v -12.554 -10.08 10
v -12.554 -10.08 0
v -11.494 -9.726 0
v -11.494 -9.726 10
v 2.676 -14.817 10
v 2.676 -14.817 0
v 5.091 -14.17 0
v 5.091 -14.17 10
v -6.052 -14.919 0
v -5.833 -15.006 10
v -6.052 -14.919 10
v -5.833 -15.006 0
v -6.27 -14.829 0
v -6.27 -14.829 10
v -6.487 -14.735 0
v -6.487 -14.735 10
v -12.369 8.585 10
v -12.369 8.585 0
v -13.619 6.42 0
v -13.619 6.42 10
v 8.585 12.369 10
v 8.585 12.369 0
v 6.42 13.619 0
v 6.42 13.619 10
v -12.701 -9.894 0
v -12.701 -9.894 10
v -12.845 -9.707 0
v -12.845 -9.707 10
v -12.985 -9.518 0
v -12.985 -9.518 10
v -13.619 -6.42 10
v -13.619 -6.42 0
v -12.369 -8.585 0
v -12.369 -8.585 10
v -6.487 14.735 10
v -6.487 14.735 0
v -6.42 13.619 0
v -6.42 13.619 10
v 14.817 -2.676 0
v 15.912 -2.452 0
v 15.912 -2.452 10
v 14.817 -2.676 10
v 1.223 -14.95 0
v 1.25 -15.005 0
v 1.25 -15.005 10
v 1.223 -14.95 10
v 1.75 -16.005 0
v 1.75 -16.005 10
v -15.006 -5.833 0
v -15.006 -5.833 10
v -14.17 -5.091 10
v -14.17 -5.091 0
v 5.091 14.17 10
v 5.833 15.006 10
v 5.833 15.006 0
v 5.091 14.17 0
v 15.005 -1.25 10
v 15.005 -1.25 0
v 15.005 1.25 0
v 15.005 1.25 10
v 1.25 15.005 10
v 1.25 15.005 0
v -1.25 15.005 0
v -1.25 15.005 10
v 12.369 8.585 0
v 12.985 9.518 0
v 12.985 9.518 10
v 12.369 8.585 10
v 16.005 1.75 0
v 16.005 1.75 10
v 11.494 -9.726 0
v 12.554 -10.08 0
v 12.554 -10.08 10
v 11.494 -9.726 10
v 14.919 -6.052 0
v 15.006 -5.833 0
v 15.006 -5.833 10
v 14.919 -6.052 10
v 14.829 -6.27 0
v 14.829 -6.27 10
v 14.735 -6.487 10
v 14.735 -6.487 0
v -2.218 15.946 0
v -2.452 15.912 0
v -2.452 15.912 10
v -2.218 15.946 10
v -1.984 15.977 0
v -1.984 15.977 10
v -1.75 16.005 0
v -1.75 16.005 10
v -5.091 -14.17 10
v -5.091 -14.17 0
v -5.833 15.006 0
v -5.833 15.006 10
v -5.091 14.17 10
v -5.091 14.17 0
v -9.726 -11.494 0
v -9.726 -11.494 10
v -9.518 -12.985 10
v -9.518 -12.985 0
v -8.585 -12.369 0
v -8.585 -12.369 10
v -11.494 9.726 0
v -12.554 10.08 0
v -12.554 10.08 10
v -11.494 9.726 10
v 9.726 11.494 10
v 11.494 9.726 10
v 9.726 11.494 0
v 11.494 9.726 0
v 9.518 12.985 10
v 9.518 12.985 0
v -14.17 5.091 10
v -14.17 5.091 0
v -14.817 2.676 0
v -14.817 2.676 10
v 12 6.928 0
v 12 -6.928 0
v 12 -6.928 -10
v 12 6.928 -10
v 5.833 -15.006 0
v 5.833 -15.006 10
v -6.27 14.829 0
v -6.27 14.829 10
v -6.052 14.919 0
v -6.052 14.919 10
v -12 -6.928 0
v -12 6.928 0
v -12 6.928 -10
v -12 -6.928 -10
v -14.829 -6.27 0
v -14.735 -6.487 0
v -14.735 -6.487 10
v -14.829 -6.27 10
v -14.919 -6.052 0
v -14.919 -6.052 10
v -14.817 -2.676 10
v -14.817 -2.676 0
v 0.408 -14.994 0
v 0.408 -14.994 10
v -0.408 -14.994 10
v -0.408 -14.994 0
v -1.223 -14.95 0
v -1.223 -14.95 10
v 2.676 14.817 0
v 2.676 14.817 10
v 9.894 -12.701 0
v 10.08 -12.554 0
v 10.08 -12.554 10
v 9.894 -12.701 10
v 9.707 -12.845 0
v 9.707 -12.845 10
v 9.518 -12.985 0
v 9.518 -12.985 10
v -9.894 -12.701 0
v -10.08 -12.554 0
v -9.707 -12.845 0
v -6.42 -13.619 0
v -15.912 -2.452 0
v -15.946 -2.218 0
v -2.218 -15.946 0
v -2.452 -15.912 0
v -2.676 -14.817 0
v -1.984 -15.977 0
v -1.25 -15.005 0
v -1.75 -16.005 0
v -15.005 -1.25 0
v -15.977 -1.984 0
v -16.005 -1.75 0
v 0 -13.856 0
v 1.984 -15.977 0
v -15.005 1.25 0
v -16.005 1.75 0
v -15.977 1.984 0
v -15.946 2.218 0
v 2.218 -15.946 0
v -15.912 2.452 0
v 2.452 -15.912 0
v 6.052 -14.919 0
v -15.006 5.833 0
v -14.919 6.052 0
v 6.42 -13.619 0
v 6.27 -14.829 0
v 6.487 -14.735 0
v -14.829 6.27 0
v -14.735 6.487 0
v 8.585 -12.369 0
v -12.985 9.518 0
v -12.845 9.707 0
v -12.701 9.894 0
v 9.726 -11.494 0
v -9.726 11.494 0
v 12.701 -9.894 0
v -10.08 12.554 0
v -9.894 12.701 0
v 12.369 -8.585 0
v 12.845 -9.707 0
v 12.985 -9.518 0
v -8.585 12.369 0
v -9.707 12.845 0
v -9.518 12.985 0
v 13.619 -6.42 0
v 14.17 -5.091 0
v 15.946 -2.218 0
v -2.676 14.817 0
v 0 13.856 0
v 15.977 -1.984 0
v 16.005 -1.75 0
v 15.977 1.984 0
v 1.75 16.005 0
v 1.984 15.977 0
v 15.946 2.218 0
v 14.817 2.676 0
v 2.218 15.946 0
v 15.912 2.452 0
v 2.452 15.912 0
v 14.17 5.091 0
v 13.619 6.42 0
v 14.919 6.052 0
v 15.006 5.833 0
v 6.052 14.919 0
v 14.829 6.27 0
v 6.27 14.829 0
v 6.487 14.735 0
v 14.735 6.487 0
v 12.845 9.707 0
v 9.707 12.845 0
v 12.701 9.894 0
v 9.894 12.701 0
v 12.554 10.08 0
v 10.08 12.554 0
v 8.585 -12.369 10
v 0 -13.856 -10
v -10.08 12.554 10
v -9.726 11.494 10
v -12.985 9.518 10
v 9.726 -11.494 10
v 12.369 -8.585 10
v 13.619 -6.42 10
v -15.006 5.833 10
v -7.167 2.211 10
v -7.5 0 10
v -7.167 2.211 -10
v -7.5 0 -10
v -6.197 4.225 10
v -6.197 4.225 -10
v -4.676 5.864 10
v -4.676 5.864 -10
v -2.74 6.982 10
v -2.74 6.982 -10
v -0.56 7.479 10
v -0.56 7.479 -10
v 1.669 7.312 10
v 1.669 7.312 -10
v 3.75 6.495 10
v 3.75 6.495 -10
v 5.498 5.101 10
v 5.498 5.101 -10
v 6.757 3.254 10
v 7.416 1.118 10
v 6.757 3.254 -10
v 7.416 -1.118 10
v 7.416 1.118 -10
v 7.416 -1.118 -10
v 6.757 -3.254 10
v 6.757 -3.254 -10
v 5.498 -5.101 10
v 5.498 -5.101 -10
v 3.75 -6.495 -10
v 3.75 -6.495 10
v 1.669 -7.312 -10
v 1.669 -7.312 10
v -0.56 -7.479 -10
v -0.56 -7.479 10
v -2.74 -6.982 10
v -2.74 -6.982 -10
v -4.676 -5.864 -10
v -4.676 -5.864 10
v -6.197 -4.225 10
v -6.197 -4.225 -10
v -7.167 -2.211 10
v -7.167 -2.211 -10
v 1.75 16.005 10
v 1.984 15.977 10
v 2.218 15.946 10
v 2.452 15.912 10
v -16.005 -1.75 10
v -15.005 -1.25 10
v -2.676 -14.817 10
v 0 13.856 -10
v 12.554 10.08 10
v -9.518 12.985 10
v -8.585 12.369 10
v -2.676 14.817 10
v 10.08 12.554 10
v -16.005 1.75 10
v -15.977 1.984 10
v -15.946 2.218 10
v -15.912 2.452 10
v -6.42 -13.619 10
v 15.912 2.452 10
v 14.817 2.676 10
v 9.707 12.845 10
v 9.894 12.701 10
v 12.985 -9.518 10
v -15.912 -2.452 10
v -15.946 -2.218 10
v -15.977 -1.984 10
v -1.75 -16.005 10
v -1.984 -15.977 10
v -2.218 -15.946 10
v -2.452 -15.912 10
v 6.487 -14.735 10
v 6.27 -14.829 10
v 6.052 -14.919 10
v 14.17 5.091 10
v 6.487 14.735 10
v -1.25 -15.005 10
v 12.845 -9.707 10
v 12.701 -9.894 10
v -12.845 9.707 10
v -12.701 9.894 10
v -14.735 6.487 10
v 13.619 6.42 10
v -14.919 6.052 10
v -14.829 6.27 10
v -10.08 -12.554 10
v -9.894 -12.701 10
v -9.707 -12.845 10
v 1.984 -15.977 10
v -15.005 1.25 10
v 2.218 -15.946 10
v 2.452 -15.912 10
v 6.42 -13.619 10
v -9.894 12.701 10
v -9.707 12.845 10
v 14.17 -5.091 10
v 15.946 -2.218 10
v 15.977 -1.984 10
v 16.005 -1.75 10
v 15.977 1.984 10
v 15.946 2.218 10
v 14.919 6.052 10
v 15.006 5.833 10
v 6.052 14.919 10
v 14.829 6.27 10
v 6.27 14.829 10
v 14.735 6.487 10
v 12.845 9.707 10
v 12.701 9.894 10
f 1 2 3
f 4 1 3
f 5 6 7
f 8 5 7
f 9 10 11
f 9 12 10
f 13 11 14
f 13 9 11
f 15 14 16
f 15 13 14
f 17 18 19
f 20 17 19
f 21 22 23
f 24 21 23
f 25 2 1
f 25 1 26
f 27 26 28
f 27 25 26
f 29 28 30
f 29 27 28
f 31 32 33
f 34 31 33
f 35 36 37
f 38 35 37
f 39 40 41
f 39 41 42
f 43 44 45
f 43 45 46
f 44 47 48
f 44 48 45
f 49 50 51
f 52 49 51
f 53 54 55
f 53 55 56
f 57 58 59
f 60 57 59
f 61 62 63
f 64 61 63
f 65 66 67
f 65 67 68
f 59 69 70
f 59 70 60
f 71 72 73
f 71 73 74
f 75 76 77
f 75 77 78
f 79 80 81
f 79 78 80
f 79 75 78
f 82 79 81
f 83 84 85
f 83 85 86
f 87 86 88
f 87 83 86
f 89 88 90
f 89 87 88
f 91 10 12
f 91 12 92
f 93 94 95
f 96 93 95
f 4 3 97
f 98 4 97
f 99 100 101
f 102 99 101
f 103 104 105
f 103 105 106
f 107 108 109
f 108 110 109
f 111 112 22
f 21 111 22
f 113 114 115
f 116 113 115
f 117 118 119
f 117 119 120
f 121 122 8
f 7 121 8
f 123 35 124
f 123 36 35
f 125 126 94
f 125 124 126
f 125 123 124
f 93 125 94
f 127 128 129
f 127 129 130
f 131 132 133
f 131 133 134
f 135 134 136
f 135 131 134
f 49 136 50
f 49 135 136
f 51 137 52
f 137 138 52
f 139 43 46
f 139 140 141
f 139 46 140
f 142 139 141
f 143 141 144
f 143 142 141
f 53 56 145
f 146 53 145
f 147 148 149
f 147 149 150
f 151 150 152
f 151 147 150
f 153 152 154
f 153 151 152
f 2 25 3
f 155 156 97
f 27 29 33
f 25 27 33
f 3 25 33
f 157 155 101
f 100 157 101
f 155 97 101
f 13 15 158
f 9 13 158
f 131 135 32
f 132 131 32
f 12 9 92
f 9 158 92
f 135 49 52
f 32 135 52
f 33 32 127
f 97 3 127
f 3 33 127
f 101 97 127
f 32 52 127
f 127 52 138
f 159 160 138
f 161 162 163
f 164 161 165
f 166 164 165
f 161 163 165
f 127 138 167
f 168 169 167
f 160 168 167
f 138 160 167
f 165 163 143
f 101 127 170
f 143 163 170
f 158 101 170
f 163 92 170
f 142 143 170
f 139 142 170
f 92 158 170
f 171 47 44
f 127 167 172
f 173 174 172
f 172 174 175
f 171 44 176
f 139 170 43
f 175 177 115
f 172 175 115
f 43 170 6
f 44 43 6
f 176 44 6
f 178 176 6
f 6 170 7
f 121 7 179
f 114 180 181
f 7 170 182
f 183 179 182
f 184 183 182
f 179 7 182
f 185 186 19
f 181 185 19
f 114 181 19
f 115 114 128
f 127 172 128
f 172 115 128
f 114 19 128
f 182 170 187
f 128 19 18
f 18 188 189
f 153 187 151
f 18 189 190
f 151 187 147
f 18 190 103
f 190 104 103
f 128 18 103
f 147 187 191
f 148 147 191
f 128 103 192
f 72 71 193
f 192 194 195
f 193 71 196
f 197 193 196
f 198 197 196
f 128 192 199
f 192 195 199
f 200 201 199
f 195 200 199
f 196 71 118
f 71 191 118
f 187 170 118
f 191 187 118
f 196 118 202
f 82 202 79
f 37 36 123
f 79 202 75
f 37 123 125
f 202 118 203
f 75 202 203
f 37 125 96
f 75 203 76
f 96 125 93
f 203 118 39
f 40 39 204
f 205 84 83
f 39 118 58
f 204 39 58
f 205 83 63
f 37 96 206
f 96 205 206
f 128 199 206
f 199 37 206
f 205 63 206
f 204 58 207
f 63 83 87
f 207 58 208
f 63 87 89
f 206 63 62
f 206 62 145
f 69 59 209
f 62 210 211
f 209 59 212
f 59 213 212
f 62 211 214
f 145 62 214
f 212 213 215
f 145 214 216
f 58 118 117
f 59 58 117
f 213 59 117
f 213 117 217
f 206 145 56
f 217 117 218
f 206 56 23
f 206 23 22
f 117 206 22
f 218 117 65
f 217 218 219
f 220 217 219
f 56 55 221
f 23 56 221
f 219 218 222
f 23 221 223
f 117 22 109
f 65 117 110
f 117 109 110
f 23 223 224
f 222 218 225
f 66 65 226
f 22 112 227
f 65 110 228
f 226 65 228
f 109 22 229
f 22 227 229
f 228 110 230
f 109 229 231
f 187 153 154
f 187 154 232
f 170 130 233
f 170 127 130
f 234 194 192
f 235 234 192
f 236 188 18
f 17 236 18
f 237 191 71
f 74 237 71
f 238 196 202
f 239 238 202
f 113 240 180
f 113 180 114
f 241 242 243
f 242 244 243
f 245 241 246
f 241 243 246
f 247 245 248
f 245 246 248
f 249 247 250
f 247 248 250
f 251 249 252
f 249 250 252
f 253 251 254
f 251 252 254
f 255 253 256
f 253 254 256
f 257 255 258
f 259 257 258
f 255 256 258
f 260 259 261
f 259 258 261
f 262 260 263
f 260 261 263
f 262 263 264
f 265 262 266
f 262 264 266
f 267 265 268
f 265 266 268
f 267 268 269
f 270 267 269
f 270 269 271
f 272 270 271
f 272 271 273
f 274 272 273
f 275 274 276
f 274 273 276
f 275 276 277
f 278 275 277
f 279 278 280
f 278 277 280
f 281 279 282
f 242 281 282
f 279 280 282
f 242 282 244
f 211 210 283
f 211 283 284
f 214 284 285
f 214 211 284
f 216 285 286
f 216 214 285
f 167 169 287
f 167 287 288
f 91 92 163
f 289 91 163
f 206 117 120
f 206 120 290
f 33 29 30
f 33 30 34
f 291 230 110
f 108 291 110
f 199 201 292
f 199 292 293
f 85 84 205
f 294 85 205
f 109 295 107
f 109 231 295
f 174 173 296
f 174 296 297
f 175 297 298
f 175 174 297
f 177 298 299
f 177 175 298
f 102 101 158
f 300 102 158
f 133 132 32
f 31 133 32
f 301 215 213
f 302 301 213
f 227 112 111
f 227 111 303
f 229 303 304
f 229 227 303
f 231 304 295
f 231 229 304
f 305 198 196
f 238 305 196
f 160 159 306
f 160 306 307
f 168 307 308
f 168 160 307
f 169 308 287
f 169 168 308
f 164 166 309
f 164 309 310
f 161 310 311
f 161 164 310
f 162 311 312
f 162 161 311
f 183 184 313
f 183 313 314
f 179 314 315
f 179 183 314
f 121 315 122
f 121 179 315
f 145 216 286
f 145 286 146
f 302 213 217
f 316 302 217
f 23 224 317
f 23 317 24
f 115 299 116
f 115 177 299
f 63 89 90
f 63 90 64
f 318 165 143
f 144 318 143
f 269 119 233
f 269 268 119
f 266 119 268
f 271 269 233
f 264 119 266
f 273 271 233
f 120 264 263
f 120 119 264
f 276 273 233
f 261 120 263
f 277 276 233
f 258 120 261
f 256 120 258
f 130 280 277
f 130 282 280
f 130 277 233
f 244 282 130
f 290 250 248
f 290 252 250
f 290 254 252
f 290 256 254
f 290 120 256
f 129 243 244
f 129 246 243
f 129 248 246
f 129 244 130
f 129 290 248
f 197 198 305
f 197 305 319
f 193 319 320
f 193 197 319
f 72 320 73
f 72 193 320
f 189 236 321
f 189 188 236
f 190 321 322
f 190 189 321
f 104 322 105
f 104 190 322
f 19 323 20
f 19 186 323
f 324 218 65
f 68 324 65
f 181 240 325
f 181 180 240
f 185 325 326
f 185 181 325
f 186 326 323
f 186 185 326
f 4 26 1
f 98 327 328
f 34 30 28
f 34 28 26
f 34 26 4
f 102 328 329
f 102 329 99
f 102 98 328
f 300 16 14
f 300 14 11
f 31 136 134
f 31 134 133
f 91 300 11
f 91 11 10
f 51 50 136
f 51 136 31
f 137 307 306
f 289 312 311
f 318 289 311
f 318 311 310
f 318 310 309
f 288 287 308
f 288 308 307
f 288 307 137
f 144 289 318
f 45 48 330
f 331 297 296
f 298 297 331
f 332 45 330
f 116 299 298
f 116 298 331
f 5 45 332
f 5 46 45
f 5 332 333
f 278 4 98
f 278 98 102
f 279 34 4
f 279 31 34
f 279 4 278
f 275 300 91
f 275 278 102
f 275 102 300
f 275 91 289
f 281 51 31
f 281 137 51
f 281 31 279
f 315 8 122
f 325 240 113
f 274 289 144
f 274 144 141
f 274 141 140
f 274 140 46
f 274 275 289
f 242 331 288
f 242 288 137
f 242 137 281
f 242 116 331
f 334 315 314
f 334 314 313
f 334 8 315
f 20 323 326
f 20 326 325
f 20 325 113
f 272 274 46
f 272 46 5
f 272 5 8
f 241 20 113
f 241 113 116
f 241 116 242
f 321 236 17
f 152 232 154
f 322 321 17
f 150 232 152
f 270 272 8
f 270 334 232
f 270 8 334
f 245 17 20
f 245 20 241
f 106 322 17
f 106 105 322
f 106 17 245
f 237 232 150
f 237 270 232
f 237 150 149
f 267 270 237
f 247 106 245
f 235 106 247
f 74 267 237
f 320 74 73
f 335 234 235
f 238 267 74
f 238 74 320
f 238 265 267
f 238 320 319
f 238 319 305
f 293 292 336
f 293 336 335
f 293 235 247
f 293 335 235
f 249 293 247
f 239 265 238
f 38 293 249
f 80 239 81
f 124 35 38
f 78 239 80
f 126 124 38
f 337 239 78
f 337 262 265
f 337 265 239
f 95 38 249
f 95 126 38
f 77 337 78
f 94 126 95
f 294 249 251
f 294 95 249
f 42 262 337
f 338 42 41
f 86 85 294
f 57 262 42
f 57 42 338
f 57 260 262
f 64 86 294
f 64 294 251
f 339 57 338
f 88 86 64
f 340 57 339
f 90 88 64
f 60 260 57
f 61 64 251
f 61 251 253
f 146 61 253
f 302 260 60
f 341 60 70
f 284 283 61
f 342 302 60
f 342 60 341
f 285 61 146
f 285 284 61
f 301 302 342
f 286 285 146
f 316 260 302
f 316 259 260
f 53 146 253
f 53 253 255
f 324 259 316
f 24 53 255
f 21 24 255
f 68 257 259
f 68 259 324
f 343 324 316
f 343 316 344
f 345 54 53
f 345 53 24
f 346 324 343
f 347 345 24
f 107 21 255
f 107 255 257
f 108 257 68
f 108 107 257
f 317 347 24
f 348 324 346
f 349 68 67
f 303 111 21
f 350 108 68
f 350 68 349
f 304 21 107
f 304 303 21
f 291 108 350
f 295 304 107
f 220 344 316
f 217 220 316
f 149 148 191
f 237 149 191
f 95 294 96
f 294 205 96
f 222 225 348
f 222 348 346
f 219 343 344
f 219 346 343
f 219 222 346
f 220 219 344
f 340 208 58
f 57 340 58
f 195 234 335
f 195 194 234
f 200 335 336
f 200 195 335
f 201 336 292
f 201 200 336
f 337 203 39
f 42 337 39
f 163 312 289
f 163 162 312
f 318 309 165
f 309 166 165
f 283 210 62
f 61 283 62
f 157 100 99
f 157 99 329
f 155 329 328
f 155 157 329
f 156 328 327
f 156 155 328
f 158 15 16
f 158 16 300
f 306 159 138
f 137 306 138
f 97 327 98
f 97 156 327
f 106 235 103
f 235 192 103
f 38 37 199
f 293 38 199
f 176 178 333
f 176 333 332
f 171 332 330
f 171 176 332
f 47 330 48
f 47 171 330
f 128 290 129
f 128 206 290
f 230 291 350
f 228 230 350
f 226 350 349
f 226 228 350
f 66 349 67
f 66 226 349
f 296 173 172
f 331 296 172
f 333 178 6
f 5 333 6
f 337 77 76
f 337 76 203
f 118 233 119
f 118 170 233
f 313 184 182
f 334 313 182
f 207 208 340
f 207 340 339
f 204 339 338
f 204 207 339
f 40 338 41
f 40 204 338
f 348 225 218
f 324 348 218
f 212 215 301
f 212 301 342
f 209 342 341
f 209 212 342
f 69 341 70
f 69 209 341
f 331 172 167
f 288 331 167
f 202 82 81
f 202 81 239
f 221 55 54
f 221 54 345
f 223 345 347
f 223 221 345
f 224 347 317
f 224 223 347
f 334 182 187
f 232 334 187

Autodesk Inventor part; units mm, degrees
ref_plane "YZ Plane" through (0, 0, 0) normal (1, 0, 0) x (0, 1, 0)
ref_plane "XZ Plane" through (0, 0, 0) normal (0, 1, 0) x (-1, 0, 0)
ref_plane "XY Plane" through (0, 0, 0) normal (0, 0, 1) x (1, 0, 0)
sketch "Sketch1" plane through (0, 0, 0) normal (0, 0, 1) x (1, 0, 0)
  circle A0 centre (0, 0) radius 17.25
  circle A1 centre (0, 0) radius 16.1
  circle A2 centre (0, 0) radius 15
  line L0 (-1.25, -15.0046) -> (1.25, -15.0046)
  line L1 (-1.75, -16.0046) -> (1.75, -16.0046)
  line L2 (1.75, -16.0046) -> (1.25, -15.0046)
  line L3 (-1.75, -16.0046) -> (-1.25, -15.0046)
  line L4 (-1.25, -15.0046) -> (-1.2227, -14.9501)
  line L5 (1.25, -15.0046) -> (1.2227, -14.9501)
  line L6 (2.6761, -14.8169) -> (5.0909, -14.1698)
  line L7 (2.4519, -15.9122) -> (2.6761, -14.8169)
  line L8 (2.6761, -14.8169) -> (2.6883, -14.7571)
  line L9 (5.8327, -15.0063) -> (5.0909, -14.1698)
  line L10 (5.0909, -14.1698) -> (5.0504, -14.1242)
  line L11 (6.4198, -13.6194) -> (8.5848, -12.3694)
  line L12 (6.4868, -14.7354) -> (6.4198, -13.6194)
  line L13 (6.4198, -13.6194) -> (6.4161, -13.5585)
  line L14 (9.5178, -12.9854) -> (8.5848, -12.3694)
  line L15 (8.5848, -12.3694) -> (8.534, -12.3358)
  line L16 (9.726, -11.4937) -> (11.4937, -9.726)
  line L17 (10.0795, -12.5544) -> (9.726, -11.4937)
  line L18 (9.726, -11.4937) -> (9.7067, -11.4359)
  line L19 (12.5544, -10.0795) -> (11.4937, -9.726)
  line L20 (11.4937, -9.726) -> (11.4359, -9.7067)
  line L21 (12.3694, -8.5848) -> (13.6194, -6.4198)
  line L22 (12.9854, -9.5178) -> (12.3694, -8.5848)
  line L23 (12.3694, -8.5848) -> (12.3358, -8.534)
  line L24 (14.7354, -6.4868) -> (13.6194, -6.4198)
  line L25 (13.6194, -6.4198) -> (13.5585, -6.4161)
  line L26 (14.1698, -5.0909) -> (14.8169, -2.6761)
  line L27 (15.0063, -5.8327) -> (14.1698, -5.0909)
  line L28 (14.1698, -5.0909) -> (14.1242, -5.0504)
  line L29 (15.9122, -2.4519) -> (14.8169, -2.6761)
  line L30 (14.8169, -2.6761) -> (14.7571, -2.6883)
  line L31 (15.0046, -1.25) -> (15.0046, 1.25)
  line L32 (16.0046, -1.75) -> (15.0046, -1.25)
  line L33 (15.0046, -1.25) -> (14.9501, -1.2227)
  line L34 (16.0046, 1.75) -> (15.0046, 1.25)
  line L35 (15.0046, 1.25) -> (14.9501, 1.2227)
  line L36 (14.8169, 2.6761) -> (14.1698, 5.0909)
  line L37 (15.9122, 2.4519) -> (14.8169, 2.6761)
  line L38 (14.8169, 2.6761) -> (14.7571, 2.6883)
  line L39 (15.0063, 5.8327) -> (14.1698, 5.0909)
  line L40 (14.1698, 5.0909) -> (14.1242, 5.0504)
  line L41 (13.6194, 6.4198) -> (12.3694, 8.5848)
  line L42 (14.7354, 6.4868) -> (13.6194, 6.4198)
  line L43 (13.6194, 6.4198) -> (13.5585, 6.4161)
  line L44 (12.9854, 9.5178) -> (12.3694, 8.5848)
  line L45 (12.3694, 8.5848) -> (12.3358, 8.534)
  line L46 (11.4937, 9.726) -> (9.726, 11.4937)
  line L47 (12.5544, 10.0795) -> (11.4937, 9.726)
  line L48 (11.4937, 9.726) -> (11.4359, 9.7067)
  line L49 (10.0795, 12.5544) -> (9.726, 11.4937)
  line L50 (9.726, 11.4937) -> (9.7067, 11.4359)
  line L51 (8.5848, 12.3694) -> (6.4198, 13.6194)
  line L52 (9.5178, 12.9854) -> (8.5848, 12.3694)
  line L53 (8.5848, 12.3694) -> (8.534, 12.3358)
  line L54 (6.4868, 14.7354) -> (6.4198, 13.6194)
  line L55 (6.4198, 13.6194) -> (6.4161, 13.5585)
  line L56 (5.0909, 14.1698) -> (2.6761, 14.8169)
  line L57 (5.8327, 15.0063) -> (5.0909, 14.1698)
  line L58 (5.0909, 14.1698) -> (5.0504, 14.1242)
  line L59 (2.4519, 15.9122) -> (2.6761, 14.8169)
  line L60 (2.6761, 14.8169) -> (2.6883, 14.7571)
  line L61 (1.25, 15.0046) -> (-1.25, 15.0046)
  line L62 (1.75, 16.0046) -> (1.25, 15.0046)
  line L63 (1.25, 15.0046) -> (1.2227, 14.9501)
  line L64 (-1.75, 16.0046) -> (-1.25, 15.0046)
  line L65 (-1.25, 15.0046) -> (-1.2227, 14.9501)
  line L66 (-2.6761, 14.8169) -> (-5.0909, 14.1698)
  line L67 (-2.4519, 15.9122) -> (-2.6761, 14.8169)
  line L68 (-2.6761, 14.8169) -> (-2.6883, 14.7571)
  line L69 (-5.8327, 15.0063) -> (-5.0909, 14.1698)
  line L70 (-5.0909, 14.1698) -> (-5.0504, 14.1242)
  line L71 (-6.4198, 13.6194) -> (-8.5848, 12.3694)
  line L72 (-6.4868, 14.7354) -> (-6.4198, 13.6194)
  line L73 (-6.4198, 13.6194) -> (-6.4161, 13.5585)
  line L74 (-9.5178, 12.9854) -> (-8.5848, 12.3694)
  line L75 (-8.5848, 12.3694) -> (-8.534, 12.3358)
  line L76 (-9.726, 11.4937) -> (-11.4937, 9.726)
  line L77 (-10.0795, 12.5544) -> (-9.726, 11.4937)
  line L78 (-9.726, 11.4937) -> (-9.7067, 11.4359)
  line L79 (-12.5544, 10.0795) -> (-11.4937, 9.726)
  line L80 (-11.4937, 9.726) -> (-11.4359, 9.7067)
  line L81 (-12.3694, 8.5848) -> (-13.6194, 6.4198)
  line L82 (-12.9854, 9.5178) -> (-12.3694, 8.5848)
  line L83 (-12.3694, 8.5848) -> (-12.3358, 8.534)
  line L84 (-14.7354, 6.4868) -> (-13.6194, 6.4198)
  line L85 (-13.6194, 6.4198) -> (-13.5585, 6.4161)
  line L86 (-14.1698, 5.0909) -> (-14.8169, 2.6761)
  line L87 (-15.0063, 5.8327) -> (-14.1698, 5.0909)
  line L88 (-14.1698, 5.0909) -> (-14.1242, 5.0504)
  line L89 (-15.9122, 2.4519) -> (-14.8169, 2.6761)
  line L90 (-14.8169, 2.6761) -> (-14.7571, 2.6883)
  line L91 (-15.0046, 1.25) -> (-15.0046, -1.25)
  line L92 (-16.0046, 1.75) -> (-15.0046, 1.25)
  line L93 (-15.0046, 1.25) -> (-14.9501, 1.2227)
  line L94 (-16.0046, -1.75) -> (-15.0046, -1.25)
  line L95 (-15.0046, -1.25) -> (-14.9501, -1.2227)
  line L96 (-14.8169, -2.6761) -> (-14.1698, -5.0909)
  line L97 (-15.9122, -2.4519) -> (-14.8169, -2.6761)
  line L98 (-14.8169, -2.6761) -> (-14.7571, -2.6883)
  line L99 (-15.0063, -5.8327) -> (-14.1698, -5.0909)
  line L100 (-14.1698, -5.0909) -> (-14.1242, -5.0504)
  line L101 (-13.6194, -6.4198) -> (-12.3694, -8.5848)
  line L102 (-14.7354, -6.4868) -> (-13.6194, -6.4198)
  line L103 (-13.6194, -6.4198) -> (-13.5585, -6.4161)
  line L104 (-12.9854, -9.5178) -> (-12.3694, -8.5848)
  line L105 (-12.3694, -8.5848) -> (-12.3358, -8.534)
  line L106 (-11.4937, -9.726) -> (-9.726, -11.4937)
  line L107 (-12.5544, -10.0795) -> (-11.4937, -9.726)
  line L108 (-11.4937, -9.726) -> (-11.4359, -9.7067)
  line L109 (-10.0795, -12.5544) -> (-9.726, -11.4937)
  line L110 (-9.726, -11.4937) -> (-9.7067, -11.4359)
  line L111 (-8.5848, -12.3694) -> (-6.4198, -13.6194)
  line L112 (-9.5178, -12.9854) -> (-8.5848, -12.3694)
  line L113 (-8.5848, -12.3694) -> (-8.534, -12.3358)
  line L114 (-6.4868, -14.7354) -> (-6.4198, -13.6194)
  line L115 (-6.4198, -13.6194) -> (-6.4161, -13.5585)
  line L116 (-5.0909, -14.1698) -> (-2.6761, -14.8169)
  line L117 (-5.8327, -15.0063) -> (-5.0909, -14.1698)
  line L118 (-5.0909, -14.1698) -> (-5.0504, -14.1242)
  line L119 (-2.4519, -15.9122) -> (-2.6761, -14.8169)
  line L120 (-2.6761, -14.8169) -> (-2.6883, -14.7571)
  point P0 (0, -16.0046)
  point P1 (0, -15.0046)
  point P2 (1.75, -16.0046)
  point P3 (3.8835, -14.4933)
  point P4 (7.5023, -12.9944)
  point P5 (10.6099, -10.6099)
  point P6 (12.9944, -7.5023)
  point P7 (14.4933, -3.8835)
  point P8 (15.0046, 0)
  point P9 (14.4933, 3.8835)
  point P10 (12.9944, 7.5023)
  point P11 (10.6099, 10.6099)
  point P12 (7.5023, 12.9944)
  point P13 (3.8835, 14.4933)
  point P14 (0, 15.0046)
  point P15 (-3.8835, 14.4933)
  point P16 (-7.5023, 12.9944)
  point P17 (-10.6099, 10.6099)
  point P18 (-12.9944, 7.5023)
  point P19 (-14.4933, 3.8835)
  point P20 (-15.0046, 0)
  point P21 (-14.4933, -3.8835)
  point P22 (-12.9944, -7.5023)
  point P23 (-10.6099, -10.6099)
  point P24 (-7.5023, -12.9944)
  point P25 (-3.8835, -14.4933)
  dimension "d1" = 32.2
  dimension "d0" = 34.5
  dimension "d2" = 30
  dimension "d3" = 2.5
  dimension "d4" = 3.5
  dimension "d5" = 1
  dimension "d20" = 360
extrude "Extrusion1" add sketch "Sketch1" along normal blind 10 contours L34 L35 A2 L38 L37 A1 | A1 L29 L30 A2 L33 L32 | L31 L33 A2 L35 | L39 L40 A2 L43 L42 A1 | L38 A2 L40 L36 | A2 | A1 L24 L25 A2 L28 L27 | L26 L28 A2 L30 | L44 L45 A2 L48 L47 A1 | L43 A2 L45 L41 | A1 L19 L20 A2 L23 L22 | L21 L23 A2 L25 | L49 L50 A2 L53 L52 A1 | L48 A2 L50 L46 | A1 L14 L15 A2 L18 L17 | L16 L18 A2 L20 | L54 L55 A2 L58 L57 A1 | L53 A2 L55 L51 | A1 L9 L10 A2 L13 L12 | L11 L13 A2 L15 | L59 L60 A2 L63 L62 A1 | L58 A2 L60 L56 | A1 L2 L5 A2 L8 L7 | L6 L8 A2 L10 | L64 L65 A2 L68 L67 A1 | L63 A2 L65 L61 | A1 L119 L120 A2 L4 L3 | L69 L70 A2 L73 L72 A1 | L68 A2 L70 L66 | A1 L114 L115 A2 L118 L117 | L116 L118 A2 L120 | L74 L75 A2 L78 L77 A1 | L73 A2 L75 L71 | A1 L109 L110 A2 L113 L112 | L111 L113 A2 L115 | L79 L80 A2 L83 L82 A1 | L78 A2 L80 L76 | A1 L104 L105 A2 L108 L107 | L106 L108 A2 L110 | L84 L85 A2 L88 L87 A1 | L83 A2 L85 L81 | A1 L99 L100 A2 L103 L102 | L101 L103 A2 L105 | L89 L90 A2 L93 L92 A1 | L88 A2 L90 L86 | A1 L94 L95 A2 L98 L97 | L96 L98 A2 L100 | L93 A2 L95 L91
sketch "Sketch2" plane through (0, 0, 0) normal (0, 0, -1) x (-1, 0, 0)
  line L0 (12, 6.9282) -> (12, -6.9282)
  line L1 (12, -6.9282) -> (0, -13.8564)
  line L2 (0, -13.8564) -> (-12, -6.9282)
  line L3 (-12, -6.9282) -> (-12, 6.9282)
  line L4 (-12, 6.9282) -> (0, 13.8564)
  line L5 (0, 13.8564) -> (12, 6.9282)
  point P0 (0, 0)
  point P1 (0, 0)
  dimension "d12" = 24
extrude "Extrusion2" add sketch "Sketch2" along normal blind 10
sketch "Sketch3" plane through (0, 0, -10) normal (0, 0, -1) x (-1, 0, 0)
  circle A0 centre (0, 0) radius 7.5
  dimension "d15" = 15
extrude "Extrusion3" cut sketch "Sketch3" against normal up to surface (20 mm away)
properties part number "Nastavek Millard freewheel tool"
